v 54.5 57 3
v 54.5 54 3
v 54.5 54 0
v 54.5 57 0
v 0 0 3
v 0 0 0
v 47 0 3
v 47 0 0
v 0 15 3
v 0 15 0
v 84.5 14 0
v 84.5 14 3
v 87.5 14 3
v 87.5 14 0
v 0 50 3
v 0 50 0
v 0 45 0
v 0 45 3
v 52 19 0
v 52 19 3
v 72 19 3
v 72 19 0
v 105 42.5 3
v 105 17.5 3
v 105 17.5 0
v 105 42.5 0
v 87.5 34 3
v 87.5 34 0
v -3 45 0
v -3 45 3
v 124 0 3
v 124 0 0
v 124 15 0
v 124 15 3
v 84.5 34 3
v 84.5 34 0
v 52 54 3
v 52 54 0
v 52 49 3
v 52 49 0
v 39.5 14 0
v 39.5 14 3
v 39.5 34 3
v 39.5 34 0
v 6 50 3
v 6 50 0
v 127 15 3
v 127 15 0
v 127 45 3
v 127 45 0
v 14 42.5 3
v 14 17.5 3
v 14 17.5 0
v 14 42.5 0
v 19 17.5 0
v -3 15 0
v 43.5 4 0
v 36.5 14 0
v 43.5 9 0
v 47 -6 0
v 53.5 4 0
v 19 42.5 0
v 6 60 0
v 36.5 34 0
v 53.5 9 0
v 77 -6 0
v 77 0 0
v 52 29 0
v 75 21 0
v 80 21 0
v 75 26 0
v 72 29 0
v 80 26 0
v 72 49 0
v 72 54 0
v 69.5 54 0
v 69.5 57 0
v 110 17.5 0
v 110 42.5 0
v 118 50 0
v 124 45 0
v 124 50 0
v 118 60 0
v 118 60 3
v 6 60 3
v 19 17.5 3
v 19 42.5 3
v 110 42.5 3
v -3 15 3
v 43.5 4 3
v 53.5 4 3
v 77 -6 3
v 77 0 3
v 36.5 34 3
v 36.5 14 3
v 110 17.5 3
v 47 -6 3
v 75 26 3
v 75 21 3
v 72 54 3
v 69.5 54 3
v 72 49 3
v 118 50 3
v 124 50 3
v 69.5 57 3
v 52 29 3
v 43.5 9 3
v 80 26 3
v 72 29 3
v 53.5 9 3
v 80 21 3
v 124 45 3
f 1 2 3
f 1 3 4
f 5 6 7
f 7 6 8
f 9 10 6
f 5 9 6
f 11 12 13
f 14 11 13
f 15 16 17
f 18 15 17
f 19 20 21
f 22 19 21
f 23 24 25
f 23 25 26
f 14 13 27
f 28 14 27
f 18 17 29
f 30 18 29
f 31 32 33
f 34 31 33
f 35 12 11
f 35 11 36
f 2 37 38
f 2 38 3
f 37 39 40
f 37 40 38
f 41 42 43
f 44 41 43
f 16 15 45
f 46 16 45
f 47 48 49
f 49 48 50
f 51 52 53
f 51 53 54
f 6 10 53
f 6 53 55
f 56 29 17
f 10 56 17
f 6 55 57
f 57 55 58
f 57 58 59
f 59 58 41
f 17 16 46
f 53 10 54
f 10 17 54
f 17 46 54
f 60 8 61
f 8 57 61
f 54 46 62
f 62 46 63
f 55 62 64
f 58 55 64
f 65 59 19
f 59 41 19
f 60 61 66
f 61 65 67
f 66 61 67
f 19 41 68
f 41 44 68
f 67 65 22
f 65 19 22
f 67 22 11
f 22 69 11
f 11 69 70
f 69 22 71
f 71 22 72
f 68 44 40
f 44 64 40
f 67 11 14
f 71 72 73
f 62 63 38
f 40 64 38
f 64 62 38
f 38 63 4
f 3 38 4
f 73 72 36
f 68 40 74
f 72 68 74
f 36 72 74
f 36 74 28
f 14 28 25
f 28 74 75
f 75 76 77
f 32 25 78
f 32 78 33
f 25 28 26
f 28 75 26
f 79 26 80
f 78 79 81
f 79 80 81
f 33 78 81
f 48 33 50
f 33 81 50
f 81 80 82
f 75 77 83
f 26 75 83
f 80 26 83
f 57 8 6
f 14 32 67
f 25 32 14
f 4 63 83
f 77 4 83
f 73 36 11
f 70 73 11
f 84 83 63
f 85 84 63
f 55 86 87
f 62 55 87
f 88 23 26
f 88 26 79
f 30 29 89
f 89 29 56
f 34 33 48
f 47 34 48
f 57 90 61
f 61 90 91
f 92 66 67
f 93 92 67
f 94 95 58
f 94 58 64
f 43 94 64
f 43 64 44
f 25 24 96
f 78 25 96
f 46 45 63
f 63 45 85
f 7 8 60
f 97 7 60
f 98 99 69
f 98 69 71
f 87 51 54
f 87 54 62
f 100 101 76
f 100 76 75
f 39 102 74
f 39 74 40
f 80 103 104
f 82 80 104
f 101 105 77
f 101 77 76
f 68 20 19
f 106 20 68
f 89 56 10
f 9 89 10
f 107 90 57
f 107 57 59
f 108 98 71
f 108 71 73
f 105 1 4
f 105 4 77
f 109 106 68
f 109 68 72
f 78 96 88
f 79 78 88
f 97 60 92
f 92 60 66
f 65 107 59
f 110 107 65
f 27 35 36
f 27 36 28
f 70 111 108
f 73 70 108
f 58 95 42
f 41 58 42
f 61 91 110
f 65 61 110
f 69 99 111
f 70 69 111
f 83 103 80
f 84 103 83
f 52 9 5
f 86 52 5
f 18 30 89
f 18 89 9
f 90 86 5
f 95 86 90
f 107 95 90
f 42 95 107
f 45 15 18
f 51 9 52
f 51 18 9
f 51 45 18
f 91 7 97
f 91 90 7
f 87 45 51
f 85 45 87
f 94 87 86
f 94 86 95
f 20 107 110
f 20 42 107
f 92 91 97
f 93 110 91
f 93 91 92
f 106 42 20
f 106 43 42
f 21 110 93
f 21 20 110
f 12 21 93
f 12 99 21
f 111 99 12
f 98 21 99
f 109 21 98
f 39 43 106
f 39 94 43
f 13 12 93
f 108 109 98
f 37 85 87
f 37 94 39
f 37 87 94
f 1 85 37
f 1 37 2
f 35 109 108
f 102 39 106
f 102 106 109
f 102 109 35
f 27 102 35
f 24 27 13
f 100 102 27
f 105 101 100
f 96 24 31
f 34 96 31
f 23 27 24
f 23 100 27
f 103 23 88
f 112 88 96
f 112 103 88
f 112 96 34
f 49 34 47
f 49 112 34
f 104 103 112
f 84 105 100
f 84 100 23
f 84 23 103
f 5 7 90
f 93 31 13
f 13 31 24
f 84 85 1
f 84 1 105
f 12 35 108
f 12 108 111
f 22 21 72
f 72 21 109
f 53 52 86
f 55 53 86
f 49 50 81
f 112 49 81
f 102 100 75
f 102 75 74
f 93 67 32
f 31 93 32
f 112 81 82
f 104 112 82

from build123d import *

# Parameters (mm, degrees)
BOSS_EXTRUDE1_DEPTH = 3
SKETCH2_W           = 6
SKETCH2_H           = 10
CUT_EXTRUDE1_DEPTH  = 141.491992654
SKETCH3_W           = 3
SKETCH3_H           = 20
SKETCH3_W_2         = 20
SKETCH3_H_2         = 10
SKETCH3_W_3         = 10
SKETCH3_H_3         = 5
SKETCH3_W_4         = 5
CUT_EXTRUDE2_DEPTH  = 141.491992654
SKETCH4_W           = 5
SKETCH4_H           = 25
CUT_EXTRUDE3_DEPTH  = 141.491992654


with BuildPart() as part:
    # Sketch1 → Boss-Extrude1 (new body)
    with BuildSketch(Plane.XY):
        Polygon((0, 0), (47, 0), (47, -6), (77, -6), (77, 0), (124, 0), (124, 15), (127, 15), (127, 45), (124, 45), (124, 60), (0, 60), (0, 45), (-3, 45), (-3, 15), (0, 15), align=None)
    extrude(amount=BOSS_EXTRUDE1_DEPTH)

    # Sketch2 → Cut-Extrude1 (cut, through all)
    with BuildSketch(Plane.XY.offset(3)):
        with Locations((3, 55)):
            Rectangle(SKETCH2_W, SKETCH2_H)
        with Locations((121, 55)):
            Rectangle(SKETCH2_W, SKETCH2_H)
    extrude(amount=-CUT_EXTRUDE1_DEPTH, mode=Mode.SUBTRACT)

    # Sketch3 → Cut-Extrude2 (cut, through all)
    with BuildSketch(Plane.XY.offset(3)):
        Polygon((54.5, 57), (69.5, 57), (69.5, 54), (72, 54), (72, 49), (52, 49), (52, 54), (54.5, 54), align=None)
        with Locations((38, 24)):
            Rectangle(SKETCH3_W, SKETCH3_H)
        with Locations((86, 24)):
            Rectangle(SKETCH3_W, SKETCH3_H)
        with Locations((62, 24)):
            Rectangle(SKETCH3_W_2, SKETCH3_H_2)
        with Locations((48.5, 6.5)):
            Rectangle(SKETCH3_W_3, SKETCH3_H_3)
        with Locations((77.5, 23.5)):
            Rectangle(SKETCH3_W_4, SKETCH3_H_3)
    extrude(amount=-CUT_EXTRUDE2_DEPTH, mode=Mode.SUBTRACT)

    # Sketch4 → Cut-Extrude3 (cut, through all)
    with BuildSketch(Plane.XY.offset(3)):
        with Locations((16.5, 30)):
            Rectangle(SKETCH4_W, SKETCH4_H)
        with Locations((107.5, 30)):
            Rectangle(SKETCH4_W, SKETCH4_H)
    extrude(amount=-CUT_EXTRUDE3_DEPTH, mode=Mode.SUBTRACT)


solid = part.part
